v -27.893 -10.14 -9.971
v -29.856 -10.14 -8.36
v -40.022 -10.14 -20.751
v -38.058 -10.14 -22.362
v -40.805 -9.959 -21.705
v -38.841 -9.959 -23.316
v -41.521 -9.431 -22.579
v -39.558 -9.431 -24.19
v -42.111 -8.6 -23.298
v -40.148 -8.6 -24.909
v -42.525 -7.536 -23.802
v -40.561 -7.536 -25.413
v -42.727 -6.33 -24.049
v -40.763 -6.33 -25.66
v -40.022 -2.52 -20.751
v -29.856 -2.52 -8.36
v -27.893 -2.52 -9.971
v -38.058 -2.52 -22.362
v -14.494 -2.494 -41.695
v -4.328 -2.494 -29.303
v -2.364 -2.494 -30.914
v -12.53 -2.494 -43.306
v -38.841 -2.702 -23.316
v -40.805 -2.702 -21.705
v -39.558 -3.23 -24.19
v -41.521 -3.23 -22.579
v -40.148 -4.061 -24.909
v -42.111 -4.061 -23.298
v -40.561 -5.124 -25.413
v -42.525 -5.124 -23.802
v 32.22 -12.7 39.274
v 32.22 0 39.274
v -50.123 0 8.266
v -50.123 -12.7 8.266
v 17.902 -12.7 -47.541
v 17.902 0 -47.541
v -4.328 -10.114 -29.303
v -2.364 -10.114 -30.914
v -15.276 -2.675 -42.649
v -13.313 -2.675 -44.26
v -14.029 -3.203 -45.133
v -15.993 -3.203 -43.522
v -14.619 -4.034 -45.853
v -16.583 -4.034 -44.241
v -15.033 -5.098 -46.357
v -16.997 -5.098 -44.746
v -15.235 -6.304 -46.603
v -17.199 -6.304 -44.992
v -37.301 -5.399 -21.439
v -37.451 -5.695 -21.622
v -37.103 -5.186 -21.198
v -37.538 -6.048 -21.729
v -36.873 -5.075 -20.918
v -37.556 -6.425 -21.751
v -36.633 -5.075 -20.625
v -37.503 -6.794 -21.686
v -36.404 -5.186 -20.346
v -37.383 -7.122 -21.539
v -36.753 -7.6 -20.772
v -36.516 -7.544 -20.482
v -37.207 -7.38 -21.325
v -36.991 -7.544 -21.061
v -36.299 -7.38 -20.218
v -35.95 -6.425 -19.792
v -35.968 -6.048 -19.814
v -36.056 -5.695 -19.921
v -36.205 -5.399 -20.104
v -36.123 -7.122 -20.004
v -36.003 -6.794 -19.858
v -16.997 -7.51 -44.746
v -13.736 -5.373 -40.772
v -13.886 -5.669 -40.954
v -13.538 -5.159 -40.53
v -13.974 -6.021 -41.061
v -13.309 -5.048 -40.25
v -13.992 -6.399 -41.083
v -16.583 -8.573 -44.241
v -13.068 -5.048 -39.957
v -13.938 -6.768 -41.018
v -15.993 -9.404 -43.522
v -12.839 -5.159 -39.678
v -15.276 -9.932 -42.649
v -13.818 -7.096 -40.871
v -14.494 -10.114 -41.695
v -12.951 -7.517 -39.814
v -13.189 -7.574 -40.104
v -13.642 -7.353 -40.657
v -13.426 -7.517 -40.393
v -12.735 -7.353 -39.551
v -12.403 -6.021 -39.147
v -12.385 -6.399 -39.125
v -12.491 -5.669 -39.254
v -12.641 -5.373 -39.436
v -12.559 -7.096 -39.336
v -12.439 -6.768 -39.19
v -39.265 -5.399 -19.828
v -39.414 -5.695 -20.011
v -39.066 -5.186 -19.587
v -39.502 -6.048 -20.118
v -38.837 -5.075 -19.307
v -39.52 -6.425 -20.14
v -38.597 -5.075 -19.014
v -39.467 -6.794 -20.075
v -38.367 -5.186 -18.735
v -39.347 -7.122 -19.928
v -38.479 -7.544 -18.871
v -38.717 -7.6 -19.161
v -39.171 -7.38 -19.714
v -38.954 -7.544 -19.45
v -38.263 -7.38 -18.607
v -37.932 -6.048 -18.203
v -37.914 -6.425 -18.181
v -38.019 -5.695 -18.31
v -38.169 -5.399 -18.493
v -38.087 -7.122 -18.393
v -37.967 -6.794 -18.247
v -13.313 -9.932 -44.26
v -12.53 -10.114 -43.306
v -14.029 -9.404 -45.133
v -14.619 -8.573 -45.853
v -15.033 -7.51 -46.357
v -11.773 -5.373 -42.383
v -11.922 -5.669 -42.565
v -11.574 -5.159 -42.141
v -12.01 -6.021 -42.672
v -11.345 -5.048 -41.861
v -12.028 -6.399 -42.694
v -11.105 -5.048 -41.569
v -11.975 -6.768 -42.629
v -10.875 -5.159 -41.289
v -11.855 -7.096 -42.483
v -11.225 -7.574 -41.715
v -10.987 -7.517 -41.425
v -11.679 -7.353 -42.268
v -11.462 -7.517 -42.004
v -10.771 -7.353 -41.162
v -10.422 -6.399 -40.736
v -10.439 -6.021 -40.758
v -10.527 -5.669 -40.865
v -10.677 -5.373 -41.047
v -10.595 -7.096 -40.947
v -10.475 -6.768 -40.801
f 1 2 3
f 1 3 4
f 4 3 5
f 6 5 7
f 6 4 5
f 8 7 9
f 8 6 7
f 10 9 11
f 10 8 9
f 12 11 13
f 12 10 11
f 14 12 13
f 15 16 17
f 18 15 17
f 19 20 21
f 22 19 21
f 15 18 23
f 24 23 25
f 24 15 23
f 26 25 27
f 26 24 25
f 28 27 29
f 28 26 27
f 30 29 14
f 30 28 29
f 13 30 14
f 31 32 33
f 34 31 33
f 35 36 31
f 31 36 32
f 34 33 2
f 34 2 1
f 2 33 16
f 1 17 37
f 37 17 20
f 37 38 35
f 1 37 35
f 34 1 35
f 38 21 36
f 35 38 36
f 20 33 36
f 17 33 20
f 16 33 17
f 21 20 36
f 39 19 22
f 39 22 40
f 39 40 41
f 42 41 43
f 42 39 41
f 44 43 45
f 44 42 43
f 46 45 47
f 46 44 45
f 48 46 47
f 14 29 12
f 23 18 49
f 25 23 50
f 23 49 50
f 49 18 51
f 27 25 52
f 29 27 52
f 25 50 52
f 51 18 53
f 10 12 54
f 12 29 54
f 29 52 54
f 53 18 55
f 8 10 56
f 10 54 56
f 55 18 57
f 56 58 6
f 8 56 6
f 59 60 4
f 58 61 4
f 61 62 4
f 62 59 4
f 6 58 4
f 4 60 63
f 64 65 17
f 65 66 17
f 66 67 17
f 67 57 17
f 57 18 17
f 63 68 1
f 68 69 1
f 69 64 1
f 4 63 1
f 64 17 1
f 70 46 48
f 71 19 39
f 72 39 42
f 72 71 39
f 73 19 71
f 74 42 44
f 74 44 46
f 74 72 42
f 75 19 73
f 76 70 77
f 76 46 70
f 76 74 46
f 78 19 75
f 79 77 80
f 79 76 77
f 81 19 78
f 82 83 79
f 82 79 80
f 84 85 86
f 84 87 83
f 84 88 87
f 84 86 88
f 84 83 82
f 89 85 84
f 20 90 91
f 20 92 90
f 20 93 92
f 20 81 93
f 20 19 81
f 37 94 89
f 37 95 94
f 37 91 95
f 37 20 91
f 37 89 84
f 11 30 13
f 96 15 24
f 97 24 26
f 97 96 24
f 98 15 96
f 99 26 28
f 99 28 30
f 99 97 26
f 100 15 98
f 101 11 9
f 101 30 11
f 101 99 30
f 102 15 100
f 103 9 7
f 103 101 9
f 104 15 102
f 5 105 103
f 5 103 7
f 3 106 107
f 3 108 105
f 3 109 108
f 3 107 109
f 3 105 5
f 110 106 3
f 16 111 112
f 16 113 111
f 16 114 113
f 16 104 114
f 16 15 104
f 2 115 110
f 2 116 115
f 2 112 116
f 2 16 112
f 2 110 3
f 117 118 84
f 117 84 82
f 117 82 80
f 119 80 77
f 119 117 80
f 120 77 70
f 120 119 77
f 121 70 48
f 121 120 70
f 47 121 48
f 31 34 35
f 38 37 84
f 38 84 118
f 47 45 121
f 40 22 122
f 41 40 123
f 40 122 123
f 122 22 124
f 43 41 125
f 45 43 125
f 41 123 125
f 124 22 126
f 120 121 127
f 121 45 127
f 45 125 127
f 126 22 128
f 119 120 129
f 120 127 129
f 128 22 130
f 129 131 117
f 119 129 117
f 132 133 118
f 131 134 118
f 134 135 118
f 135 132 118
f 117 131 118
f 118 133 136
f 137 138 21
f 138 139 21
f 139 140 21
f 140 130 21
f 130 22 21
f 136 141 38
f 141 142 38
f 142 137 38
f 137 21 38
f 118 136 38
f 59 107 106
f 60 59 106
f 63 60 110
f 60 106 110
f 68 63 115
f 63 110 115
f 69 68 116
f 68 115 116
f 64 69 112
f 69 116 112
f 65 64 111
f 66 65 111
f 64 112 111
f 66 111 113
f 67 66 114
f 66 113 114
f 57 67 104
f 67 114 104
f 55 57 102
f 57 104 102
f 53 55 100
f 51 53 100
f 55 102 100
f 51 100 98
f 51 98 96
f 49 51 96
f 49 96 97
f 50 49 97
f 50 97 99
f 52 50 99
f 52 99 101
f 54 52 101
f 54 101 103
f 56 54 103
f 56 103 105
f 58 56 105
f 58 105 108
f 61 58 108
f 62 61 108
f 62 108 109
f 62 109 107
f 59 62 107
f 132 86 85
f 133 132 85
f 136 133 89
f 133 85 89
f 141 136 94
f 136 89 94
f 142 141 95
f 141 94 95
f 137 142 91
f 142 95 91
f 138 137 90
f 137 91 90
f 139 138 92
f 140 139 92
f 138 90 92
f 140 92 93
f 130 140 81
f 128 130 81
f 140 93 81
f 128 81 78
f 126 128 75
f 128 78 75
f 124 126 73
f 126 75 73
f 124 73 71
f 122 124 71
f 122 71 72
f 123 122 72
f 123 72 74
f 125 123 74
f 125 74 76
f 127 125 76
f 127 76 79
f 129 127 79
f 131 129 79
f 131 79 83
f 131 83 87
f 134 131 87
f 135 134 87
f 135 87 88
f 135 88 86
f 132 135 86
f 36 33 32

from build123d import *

# Parameters (mm, degrees)
F1_DEPTH    = 12.7
F2_W        = 2.54
F2_H        = 7.62
F3_DEPTH    = 20.32
F4_R        = 1.27
F5_DEPTH    = 25.4
F6_R        = 1.27
F7_DEPTH    = 25.4
F8_T1_DEPTH = 24.0023585695
F8_T3_DEPTH = 24.0023585695
F8_T5_DEPTH = 24.0023585695
F8_T7_DEPTH = 24.0023585695


# Not quite as in the source:
# - a fillet or chamfer that OpenCascade refuses, or shapes differently, is made with other operations: its cross-section is extruded or revolved along the edge and cut away or added


with BuildPart() as f1:
    # F0 (on Front) → F1 (new body)
    with BuildSketch(Plane.XZ):
        Polygon((32.2204480681, 39.2744538637), (-50.1228987998, 8.2664996165), (17.9024507316, -47.5409534801), align=None)
    extrude(amount=F1_DEPTH)

    # F2 (on face) → F3 (join)
    with BuildSketch(Plane(origin=(-16.1102240341, 0, -19.6372269318), x_dir=(0.7731191705, 0, -0.6342607887), z_dir=(-0.6342607887, 0, -0.7731191705))):
        with Locations((-16.51, 6.3304389822)):
            Rectangle(F2_W, F2_H)
        with Locations((16.51, 6.3037265553)):
            Rectangle(F2_W, F2_H)
    extrude(amount=F3_DEPTH)

    # F4 (on face) → F5 (cut)
    with BuildSketch(Plane(origin=(-13.7460588523, 0, 11.2771568238), x_dir=(0, -1, 0), z_dir=(-0.7731191705, 0, 0.6342607887))):
        with Locations((6.3304389822, -39.37)):
            Circle(F4_R)
    extrude(amount=-F5_DEPTH, mode=Mode.SUBTRACT)

    # F6 (on face) → F7 (cut)
    with BuildSketch(Plane(origin=(11.7823361591, 0, -9.6661344204), x_dir=(0, -1, 0), z_dir=(-0.7731191705, 0, 0.6342607887))):
        with Locations((6.3037265553, -39.37)):
            Circle(F6_R)
    extrude(amount=-F7_DEPTH, mode=Mode.SUBTRACT)

    # F8: fillet of radius 4.2924717139 on 4 edges, made by hand

    # F8_s2 → F8_t1 (cut)
    with BuildSketch(Plane(origin=(-22.0425392799, 0, 18.0835230611), x_dir=(0, 1, 0), z_dir=(0.7731191705, 0, -0.6342607887))):
        with BuildLine():
            ThreePointArc((-2.5204389822, -41.4275282861), (-3.7776748391, -44.4627641431), (-6.8129106961, -45.72))
            Line((-6.8129106961, -45.72), (-2.5204389822, -45.72))
            Line((-2.5204389822, -45.72), (-2.5204389822, -41.4275282861))
        make_face()
    extrude(amount=F8_T1_DEPTH, mode=Mode.SUBTRACT)

    # F8_s4 → F8_t3 (cut)
    with BuildSketch(Plane(origin=(-3.4858557315, 0, 2.8597681832), x_dir=(0, 1, 0), z_dir=(-0.7731191705, 0, 0.6342607887))):
        with BuildLine():
            ThreePointArc((-10.1404389822, 41.4275282861), (-8.8832031252, 44.4627641431), (-5.8479672683, 45.72))
            Line((-5.8479672683, 45.72), (-10.1404389822, 45.72))
            Line((-10.1404389822, 45.72), (-10.1404389822, 41.4275282861))
        make_face()
    extrude(amount=F8_T3_DEPTH, mode=Mode.SUBTRACT)

    # F8_s6 → F8_t5 (cut)
    with BuildSketch(Plane(origin=(3.4858557315, 0, -2.8597681832), x_dir=(0, 1, 0), z_dir=(0.7731191705, 0, -0.6342607887))):
        with BuildLine():
            ThreePointArc((-2.4937265553, -41.4275282861), (-3.7509624122, -44.4627641431), (-6.7861982692, -45.72))
            Line((-6.7861982692, -45.72), (-2.4937265553, -45.72))
            Line((-2.4937265553, -45.72), (-2.4937265553, -41.4275282861))
        make_face()
    extrude(amount=F8_T5_DEPTH, mode=Mode.SUBTRACT)

    # F8_s8 → F8_t7 (cut)
    with BuildSketch(Plane(origin=(22.0425392799, 0, -18.0835230611), x_dir=(0, 1, 0), z_dir=(-0.7731191705, 0, 0.6342607887))):
        with BuildLine():
            ThreePointArc((-10.1137265553, 41.4275282861), (-8.8564906983, 44.4627641431), (-5.8212548414, 45.72))
            Line((-5.8212548414, 45.72), (-10.1137265553, 45.72))
            Line((-10.1137265553, 45.72), (-10.1137265553, 41.4275282861))
        make_face()
    extrude(amount=F8_T7_DEPTH, mode=Mode.SUBTRACT)


solid = f1.part
